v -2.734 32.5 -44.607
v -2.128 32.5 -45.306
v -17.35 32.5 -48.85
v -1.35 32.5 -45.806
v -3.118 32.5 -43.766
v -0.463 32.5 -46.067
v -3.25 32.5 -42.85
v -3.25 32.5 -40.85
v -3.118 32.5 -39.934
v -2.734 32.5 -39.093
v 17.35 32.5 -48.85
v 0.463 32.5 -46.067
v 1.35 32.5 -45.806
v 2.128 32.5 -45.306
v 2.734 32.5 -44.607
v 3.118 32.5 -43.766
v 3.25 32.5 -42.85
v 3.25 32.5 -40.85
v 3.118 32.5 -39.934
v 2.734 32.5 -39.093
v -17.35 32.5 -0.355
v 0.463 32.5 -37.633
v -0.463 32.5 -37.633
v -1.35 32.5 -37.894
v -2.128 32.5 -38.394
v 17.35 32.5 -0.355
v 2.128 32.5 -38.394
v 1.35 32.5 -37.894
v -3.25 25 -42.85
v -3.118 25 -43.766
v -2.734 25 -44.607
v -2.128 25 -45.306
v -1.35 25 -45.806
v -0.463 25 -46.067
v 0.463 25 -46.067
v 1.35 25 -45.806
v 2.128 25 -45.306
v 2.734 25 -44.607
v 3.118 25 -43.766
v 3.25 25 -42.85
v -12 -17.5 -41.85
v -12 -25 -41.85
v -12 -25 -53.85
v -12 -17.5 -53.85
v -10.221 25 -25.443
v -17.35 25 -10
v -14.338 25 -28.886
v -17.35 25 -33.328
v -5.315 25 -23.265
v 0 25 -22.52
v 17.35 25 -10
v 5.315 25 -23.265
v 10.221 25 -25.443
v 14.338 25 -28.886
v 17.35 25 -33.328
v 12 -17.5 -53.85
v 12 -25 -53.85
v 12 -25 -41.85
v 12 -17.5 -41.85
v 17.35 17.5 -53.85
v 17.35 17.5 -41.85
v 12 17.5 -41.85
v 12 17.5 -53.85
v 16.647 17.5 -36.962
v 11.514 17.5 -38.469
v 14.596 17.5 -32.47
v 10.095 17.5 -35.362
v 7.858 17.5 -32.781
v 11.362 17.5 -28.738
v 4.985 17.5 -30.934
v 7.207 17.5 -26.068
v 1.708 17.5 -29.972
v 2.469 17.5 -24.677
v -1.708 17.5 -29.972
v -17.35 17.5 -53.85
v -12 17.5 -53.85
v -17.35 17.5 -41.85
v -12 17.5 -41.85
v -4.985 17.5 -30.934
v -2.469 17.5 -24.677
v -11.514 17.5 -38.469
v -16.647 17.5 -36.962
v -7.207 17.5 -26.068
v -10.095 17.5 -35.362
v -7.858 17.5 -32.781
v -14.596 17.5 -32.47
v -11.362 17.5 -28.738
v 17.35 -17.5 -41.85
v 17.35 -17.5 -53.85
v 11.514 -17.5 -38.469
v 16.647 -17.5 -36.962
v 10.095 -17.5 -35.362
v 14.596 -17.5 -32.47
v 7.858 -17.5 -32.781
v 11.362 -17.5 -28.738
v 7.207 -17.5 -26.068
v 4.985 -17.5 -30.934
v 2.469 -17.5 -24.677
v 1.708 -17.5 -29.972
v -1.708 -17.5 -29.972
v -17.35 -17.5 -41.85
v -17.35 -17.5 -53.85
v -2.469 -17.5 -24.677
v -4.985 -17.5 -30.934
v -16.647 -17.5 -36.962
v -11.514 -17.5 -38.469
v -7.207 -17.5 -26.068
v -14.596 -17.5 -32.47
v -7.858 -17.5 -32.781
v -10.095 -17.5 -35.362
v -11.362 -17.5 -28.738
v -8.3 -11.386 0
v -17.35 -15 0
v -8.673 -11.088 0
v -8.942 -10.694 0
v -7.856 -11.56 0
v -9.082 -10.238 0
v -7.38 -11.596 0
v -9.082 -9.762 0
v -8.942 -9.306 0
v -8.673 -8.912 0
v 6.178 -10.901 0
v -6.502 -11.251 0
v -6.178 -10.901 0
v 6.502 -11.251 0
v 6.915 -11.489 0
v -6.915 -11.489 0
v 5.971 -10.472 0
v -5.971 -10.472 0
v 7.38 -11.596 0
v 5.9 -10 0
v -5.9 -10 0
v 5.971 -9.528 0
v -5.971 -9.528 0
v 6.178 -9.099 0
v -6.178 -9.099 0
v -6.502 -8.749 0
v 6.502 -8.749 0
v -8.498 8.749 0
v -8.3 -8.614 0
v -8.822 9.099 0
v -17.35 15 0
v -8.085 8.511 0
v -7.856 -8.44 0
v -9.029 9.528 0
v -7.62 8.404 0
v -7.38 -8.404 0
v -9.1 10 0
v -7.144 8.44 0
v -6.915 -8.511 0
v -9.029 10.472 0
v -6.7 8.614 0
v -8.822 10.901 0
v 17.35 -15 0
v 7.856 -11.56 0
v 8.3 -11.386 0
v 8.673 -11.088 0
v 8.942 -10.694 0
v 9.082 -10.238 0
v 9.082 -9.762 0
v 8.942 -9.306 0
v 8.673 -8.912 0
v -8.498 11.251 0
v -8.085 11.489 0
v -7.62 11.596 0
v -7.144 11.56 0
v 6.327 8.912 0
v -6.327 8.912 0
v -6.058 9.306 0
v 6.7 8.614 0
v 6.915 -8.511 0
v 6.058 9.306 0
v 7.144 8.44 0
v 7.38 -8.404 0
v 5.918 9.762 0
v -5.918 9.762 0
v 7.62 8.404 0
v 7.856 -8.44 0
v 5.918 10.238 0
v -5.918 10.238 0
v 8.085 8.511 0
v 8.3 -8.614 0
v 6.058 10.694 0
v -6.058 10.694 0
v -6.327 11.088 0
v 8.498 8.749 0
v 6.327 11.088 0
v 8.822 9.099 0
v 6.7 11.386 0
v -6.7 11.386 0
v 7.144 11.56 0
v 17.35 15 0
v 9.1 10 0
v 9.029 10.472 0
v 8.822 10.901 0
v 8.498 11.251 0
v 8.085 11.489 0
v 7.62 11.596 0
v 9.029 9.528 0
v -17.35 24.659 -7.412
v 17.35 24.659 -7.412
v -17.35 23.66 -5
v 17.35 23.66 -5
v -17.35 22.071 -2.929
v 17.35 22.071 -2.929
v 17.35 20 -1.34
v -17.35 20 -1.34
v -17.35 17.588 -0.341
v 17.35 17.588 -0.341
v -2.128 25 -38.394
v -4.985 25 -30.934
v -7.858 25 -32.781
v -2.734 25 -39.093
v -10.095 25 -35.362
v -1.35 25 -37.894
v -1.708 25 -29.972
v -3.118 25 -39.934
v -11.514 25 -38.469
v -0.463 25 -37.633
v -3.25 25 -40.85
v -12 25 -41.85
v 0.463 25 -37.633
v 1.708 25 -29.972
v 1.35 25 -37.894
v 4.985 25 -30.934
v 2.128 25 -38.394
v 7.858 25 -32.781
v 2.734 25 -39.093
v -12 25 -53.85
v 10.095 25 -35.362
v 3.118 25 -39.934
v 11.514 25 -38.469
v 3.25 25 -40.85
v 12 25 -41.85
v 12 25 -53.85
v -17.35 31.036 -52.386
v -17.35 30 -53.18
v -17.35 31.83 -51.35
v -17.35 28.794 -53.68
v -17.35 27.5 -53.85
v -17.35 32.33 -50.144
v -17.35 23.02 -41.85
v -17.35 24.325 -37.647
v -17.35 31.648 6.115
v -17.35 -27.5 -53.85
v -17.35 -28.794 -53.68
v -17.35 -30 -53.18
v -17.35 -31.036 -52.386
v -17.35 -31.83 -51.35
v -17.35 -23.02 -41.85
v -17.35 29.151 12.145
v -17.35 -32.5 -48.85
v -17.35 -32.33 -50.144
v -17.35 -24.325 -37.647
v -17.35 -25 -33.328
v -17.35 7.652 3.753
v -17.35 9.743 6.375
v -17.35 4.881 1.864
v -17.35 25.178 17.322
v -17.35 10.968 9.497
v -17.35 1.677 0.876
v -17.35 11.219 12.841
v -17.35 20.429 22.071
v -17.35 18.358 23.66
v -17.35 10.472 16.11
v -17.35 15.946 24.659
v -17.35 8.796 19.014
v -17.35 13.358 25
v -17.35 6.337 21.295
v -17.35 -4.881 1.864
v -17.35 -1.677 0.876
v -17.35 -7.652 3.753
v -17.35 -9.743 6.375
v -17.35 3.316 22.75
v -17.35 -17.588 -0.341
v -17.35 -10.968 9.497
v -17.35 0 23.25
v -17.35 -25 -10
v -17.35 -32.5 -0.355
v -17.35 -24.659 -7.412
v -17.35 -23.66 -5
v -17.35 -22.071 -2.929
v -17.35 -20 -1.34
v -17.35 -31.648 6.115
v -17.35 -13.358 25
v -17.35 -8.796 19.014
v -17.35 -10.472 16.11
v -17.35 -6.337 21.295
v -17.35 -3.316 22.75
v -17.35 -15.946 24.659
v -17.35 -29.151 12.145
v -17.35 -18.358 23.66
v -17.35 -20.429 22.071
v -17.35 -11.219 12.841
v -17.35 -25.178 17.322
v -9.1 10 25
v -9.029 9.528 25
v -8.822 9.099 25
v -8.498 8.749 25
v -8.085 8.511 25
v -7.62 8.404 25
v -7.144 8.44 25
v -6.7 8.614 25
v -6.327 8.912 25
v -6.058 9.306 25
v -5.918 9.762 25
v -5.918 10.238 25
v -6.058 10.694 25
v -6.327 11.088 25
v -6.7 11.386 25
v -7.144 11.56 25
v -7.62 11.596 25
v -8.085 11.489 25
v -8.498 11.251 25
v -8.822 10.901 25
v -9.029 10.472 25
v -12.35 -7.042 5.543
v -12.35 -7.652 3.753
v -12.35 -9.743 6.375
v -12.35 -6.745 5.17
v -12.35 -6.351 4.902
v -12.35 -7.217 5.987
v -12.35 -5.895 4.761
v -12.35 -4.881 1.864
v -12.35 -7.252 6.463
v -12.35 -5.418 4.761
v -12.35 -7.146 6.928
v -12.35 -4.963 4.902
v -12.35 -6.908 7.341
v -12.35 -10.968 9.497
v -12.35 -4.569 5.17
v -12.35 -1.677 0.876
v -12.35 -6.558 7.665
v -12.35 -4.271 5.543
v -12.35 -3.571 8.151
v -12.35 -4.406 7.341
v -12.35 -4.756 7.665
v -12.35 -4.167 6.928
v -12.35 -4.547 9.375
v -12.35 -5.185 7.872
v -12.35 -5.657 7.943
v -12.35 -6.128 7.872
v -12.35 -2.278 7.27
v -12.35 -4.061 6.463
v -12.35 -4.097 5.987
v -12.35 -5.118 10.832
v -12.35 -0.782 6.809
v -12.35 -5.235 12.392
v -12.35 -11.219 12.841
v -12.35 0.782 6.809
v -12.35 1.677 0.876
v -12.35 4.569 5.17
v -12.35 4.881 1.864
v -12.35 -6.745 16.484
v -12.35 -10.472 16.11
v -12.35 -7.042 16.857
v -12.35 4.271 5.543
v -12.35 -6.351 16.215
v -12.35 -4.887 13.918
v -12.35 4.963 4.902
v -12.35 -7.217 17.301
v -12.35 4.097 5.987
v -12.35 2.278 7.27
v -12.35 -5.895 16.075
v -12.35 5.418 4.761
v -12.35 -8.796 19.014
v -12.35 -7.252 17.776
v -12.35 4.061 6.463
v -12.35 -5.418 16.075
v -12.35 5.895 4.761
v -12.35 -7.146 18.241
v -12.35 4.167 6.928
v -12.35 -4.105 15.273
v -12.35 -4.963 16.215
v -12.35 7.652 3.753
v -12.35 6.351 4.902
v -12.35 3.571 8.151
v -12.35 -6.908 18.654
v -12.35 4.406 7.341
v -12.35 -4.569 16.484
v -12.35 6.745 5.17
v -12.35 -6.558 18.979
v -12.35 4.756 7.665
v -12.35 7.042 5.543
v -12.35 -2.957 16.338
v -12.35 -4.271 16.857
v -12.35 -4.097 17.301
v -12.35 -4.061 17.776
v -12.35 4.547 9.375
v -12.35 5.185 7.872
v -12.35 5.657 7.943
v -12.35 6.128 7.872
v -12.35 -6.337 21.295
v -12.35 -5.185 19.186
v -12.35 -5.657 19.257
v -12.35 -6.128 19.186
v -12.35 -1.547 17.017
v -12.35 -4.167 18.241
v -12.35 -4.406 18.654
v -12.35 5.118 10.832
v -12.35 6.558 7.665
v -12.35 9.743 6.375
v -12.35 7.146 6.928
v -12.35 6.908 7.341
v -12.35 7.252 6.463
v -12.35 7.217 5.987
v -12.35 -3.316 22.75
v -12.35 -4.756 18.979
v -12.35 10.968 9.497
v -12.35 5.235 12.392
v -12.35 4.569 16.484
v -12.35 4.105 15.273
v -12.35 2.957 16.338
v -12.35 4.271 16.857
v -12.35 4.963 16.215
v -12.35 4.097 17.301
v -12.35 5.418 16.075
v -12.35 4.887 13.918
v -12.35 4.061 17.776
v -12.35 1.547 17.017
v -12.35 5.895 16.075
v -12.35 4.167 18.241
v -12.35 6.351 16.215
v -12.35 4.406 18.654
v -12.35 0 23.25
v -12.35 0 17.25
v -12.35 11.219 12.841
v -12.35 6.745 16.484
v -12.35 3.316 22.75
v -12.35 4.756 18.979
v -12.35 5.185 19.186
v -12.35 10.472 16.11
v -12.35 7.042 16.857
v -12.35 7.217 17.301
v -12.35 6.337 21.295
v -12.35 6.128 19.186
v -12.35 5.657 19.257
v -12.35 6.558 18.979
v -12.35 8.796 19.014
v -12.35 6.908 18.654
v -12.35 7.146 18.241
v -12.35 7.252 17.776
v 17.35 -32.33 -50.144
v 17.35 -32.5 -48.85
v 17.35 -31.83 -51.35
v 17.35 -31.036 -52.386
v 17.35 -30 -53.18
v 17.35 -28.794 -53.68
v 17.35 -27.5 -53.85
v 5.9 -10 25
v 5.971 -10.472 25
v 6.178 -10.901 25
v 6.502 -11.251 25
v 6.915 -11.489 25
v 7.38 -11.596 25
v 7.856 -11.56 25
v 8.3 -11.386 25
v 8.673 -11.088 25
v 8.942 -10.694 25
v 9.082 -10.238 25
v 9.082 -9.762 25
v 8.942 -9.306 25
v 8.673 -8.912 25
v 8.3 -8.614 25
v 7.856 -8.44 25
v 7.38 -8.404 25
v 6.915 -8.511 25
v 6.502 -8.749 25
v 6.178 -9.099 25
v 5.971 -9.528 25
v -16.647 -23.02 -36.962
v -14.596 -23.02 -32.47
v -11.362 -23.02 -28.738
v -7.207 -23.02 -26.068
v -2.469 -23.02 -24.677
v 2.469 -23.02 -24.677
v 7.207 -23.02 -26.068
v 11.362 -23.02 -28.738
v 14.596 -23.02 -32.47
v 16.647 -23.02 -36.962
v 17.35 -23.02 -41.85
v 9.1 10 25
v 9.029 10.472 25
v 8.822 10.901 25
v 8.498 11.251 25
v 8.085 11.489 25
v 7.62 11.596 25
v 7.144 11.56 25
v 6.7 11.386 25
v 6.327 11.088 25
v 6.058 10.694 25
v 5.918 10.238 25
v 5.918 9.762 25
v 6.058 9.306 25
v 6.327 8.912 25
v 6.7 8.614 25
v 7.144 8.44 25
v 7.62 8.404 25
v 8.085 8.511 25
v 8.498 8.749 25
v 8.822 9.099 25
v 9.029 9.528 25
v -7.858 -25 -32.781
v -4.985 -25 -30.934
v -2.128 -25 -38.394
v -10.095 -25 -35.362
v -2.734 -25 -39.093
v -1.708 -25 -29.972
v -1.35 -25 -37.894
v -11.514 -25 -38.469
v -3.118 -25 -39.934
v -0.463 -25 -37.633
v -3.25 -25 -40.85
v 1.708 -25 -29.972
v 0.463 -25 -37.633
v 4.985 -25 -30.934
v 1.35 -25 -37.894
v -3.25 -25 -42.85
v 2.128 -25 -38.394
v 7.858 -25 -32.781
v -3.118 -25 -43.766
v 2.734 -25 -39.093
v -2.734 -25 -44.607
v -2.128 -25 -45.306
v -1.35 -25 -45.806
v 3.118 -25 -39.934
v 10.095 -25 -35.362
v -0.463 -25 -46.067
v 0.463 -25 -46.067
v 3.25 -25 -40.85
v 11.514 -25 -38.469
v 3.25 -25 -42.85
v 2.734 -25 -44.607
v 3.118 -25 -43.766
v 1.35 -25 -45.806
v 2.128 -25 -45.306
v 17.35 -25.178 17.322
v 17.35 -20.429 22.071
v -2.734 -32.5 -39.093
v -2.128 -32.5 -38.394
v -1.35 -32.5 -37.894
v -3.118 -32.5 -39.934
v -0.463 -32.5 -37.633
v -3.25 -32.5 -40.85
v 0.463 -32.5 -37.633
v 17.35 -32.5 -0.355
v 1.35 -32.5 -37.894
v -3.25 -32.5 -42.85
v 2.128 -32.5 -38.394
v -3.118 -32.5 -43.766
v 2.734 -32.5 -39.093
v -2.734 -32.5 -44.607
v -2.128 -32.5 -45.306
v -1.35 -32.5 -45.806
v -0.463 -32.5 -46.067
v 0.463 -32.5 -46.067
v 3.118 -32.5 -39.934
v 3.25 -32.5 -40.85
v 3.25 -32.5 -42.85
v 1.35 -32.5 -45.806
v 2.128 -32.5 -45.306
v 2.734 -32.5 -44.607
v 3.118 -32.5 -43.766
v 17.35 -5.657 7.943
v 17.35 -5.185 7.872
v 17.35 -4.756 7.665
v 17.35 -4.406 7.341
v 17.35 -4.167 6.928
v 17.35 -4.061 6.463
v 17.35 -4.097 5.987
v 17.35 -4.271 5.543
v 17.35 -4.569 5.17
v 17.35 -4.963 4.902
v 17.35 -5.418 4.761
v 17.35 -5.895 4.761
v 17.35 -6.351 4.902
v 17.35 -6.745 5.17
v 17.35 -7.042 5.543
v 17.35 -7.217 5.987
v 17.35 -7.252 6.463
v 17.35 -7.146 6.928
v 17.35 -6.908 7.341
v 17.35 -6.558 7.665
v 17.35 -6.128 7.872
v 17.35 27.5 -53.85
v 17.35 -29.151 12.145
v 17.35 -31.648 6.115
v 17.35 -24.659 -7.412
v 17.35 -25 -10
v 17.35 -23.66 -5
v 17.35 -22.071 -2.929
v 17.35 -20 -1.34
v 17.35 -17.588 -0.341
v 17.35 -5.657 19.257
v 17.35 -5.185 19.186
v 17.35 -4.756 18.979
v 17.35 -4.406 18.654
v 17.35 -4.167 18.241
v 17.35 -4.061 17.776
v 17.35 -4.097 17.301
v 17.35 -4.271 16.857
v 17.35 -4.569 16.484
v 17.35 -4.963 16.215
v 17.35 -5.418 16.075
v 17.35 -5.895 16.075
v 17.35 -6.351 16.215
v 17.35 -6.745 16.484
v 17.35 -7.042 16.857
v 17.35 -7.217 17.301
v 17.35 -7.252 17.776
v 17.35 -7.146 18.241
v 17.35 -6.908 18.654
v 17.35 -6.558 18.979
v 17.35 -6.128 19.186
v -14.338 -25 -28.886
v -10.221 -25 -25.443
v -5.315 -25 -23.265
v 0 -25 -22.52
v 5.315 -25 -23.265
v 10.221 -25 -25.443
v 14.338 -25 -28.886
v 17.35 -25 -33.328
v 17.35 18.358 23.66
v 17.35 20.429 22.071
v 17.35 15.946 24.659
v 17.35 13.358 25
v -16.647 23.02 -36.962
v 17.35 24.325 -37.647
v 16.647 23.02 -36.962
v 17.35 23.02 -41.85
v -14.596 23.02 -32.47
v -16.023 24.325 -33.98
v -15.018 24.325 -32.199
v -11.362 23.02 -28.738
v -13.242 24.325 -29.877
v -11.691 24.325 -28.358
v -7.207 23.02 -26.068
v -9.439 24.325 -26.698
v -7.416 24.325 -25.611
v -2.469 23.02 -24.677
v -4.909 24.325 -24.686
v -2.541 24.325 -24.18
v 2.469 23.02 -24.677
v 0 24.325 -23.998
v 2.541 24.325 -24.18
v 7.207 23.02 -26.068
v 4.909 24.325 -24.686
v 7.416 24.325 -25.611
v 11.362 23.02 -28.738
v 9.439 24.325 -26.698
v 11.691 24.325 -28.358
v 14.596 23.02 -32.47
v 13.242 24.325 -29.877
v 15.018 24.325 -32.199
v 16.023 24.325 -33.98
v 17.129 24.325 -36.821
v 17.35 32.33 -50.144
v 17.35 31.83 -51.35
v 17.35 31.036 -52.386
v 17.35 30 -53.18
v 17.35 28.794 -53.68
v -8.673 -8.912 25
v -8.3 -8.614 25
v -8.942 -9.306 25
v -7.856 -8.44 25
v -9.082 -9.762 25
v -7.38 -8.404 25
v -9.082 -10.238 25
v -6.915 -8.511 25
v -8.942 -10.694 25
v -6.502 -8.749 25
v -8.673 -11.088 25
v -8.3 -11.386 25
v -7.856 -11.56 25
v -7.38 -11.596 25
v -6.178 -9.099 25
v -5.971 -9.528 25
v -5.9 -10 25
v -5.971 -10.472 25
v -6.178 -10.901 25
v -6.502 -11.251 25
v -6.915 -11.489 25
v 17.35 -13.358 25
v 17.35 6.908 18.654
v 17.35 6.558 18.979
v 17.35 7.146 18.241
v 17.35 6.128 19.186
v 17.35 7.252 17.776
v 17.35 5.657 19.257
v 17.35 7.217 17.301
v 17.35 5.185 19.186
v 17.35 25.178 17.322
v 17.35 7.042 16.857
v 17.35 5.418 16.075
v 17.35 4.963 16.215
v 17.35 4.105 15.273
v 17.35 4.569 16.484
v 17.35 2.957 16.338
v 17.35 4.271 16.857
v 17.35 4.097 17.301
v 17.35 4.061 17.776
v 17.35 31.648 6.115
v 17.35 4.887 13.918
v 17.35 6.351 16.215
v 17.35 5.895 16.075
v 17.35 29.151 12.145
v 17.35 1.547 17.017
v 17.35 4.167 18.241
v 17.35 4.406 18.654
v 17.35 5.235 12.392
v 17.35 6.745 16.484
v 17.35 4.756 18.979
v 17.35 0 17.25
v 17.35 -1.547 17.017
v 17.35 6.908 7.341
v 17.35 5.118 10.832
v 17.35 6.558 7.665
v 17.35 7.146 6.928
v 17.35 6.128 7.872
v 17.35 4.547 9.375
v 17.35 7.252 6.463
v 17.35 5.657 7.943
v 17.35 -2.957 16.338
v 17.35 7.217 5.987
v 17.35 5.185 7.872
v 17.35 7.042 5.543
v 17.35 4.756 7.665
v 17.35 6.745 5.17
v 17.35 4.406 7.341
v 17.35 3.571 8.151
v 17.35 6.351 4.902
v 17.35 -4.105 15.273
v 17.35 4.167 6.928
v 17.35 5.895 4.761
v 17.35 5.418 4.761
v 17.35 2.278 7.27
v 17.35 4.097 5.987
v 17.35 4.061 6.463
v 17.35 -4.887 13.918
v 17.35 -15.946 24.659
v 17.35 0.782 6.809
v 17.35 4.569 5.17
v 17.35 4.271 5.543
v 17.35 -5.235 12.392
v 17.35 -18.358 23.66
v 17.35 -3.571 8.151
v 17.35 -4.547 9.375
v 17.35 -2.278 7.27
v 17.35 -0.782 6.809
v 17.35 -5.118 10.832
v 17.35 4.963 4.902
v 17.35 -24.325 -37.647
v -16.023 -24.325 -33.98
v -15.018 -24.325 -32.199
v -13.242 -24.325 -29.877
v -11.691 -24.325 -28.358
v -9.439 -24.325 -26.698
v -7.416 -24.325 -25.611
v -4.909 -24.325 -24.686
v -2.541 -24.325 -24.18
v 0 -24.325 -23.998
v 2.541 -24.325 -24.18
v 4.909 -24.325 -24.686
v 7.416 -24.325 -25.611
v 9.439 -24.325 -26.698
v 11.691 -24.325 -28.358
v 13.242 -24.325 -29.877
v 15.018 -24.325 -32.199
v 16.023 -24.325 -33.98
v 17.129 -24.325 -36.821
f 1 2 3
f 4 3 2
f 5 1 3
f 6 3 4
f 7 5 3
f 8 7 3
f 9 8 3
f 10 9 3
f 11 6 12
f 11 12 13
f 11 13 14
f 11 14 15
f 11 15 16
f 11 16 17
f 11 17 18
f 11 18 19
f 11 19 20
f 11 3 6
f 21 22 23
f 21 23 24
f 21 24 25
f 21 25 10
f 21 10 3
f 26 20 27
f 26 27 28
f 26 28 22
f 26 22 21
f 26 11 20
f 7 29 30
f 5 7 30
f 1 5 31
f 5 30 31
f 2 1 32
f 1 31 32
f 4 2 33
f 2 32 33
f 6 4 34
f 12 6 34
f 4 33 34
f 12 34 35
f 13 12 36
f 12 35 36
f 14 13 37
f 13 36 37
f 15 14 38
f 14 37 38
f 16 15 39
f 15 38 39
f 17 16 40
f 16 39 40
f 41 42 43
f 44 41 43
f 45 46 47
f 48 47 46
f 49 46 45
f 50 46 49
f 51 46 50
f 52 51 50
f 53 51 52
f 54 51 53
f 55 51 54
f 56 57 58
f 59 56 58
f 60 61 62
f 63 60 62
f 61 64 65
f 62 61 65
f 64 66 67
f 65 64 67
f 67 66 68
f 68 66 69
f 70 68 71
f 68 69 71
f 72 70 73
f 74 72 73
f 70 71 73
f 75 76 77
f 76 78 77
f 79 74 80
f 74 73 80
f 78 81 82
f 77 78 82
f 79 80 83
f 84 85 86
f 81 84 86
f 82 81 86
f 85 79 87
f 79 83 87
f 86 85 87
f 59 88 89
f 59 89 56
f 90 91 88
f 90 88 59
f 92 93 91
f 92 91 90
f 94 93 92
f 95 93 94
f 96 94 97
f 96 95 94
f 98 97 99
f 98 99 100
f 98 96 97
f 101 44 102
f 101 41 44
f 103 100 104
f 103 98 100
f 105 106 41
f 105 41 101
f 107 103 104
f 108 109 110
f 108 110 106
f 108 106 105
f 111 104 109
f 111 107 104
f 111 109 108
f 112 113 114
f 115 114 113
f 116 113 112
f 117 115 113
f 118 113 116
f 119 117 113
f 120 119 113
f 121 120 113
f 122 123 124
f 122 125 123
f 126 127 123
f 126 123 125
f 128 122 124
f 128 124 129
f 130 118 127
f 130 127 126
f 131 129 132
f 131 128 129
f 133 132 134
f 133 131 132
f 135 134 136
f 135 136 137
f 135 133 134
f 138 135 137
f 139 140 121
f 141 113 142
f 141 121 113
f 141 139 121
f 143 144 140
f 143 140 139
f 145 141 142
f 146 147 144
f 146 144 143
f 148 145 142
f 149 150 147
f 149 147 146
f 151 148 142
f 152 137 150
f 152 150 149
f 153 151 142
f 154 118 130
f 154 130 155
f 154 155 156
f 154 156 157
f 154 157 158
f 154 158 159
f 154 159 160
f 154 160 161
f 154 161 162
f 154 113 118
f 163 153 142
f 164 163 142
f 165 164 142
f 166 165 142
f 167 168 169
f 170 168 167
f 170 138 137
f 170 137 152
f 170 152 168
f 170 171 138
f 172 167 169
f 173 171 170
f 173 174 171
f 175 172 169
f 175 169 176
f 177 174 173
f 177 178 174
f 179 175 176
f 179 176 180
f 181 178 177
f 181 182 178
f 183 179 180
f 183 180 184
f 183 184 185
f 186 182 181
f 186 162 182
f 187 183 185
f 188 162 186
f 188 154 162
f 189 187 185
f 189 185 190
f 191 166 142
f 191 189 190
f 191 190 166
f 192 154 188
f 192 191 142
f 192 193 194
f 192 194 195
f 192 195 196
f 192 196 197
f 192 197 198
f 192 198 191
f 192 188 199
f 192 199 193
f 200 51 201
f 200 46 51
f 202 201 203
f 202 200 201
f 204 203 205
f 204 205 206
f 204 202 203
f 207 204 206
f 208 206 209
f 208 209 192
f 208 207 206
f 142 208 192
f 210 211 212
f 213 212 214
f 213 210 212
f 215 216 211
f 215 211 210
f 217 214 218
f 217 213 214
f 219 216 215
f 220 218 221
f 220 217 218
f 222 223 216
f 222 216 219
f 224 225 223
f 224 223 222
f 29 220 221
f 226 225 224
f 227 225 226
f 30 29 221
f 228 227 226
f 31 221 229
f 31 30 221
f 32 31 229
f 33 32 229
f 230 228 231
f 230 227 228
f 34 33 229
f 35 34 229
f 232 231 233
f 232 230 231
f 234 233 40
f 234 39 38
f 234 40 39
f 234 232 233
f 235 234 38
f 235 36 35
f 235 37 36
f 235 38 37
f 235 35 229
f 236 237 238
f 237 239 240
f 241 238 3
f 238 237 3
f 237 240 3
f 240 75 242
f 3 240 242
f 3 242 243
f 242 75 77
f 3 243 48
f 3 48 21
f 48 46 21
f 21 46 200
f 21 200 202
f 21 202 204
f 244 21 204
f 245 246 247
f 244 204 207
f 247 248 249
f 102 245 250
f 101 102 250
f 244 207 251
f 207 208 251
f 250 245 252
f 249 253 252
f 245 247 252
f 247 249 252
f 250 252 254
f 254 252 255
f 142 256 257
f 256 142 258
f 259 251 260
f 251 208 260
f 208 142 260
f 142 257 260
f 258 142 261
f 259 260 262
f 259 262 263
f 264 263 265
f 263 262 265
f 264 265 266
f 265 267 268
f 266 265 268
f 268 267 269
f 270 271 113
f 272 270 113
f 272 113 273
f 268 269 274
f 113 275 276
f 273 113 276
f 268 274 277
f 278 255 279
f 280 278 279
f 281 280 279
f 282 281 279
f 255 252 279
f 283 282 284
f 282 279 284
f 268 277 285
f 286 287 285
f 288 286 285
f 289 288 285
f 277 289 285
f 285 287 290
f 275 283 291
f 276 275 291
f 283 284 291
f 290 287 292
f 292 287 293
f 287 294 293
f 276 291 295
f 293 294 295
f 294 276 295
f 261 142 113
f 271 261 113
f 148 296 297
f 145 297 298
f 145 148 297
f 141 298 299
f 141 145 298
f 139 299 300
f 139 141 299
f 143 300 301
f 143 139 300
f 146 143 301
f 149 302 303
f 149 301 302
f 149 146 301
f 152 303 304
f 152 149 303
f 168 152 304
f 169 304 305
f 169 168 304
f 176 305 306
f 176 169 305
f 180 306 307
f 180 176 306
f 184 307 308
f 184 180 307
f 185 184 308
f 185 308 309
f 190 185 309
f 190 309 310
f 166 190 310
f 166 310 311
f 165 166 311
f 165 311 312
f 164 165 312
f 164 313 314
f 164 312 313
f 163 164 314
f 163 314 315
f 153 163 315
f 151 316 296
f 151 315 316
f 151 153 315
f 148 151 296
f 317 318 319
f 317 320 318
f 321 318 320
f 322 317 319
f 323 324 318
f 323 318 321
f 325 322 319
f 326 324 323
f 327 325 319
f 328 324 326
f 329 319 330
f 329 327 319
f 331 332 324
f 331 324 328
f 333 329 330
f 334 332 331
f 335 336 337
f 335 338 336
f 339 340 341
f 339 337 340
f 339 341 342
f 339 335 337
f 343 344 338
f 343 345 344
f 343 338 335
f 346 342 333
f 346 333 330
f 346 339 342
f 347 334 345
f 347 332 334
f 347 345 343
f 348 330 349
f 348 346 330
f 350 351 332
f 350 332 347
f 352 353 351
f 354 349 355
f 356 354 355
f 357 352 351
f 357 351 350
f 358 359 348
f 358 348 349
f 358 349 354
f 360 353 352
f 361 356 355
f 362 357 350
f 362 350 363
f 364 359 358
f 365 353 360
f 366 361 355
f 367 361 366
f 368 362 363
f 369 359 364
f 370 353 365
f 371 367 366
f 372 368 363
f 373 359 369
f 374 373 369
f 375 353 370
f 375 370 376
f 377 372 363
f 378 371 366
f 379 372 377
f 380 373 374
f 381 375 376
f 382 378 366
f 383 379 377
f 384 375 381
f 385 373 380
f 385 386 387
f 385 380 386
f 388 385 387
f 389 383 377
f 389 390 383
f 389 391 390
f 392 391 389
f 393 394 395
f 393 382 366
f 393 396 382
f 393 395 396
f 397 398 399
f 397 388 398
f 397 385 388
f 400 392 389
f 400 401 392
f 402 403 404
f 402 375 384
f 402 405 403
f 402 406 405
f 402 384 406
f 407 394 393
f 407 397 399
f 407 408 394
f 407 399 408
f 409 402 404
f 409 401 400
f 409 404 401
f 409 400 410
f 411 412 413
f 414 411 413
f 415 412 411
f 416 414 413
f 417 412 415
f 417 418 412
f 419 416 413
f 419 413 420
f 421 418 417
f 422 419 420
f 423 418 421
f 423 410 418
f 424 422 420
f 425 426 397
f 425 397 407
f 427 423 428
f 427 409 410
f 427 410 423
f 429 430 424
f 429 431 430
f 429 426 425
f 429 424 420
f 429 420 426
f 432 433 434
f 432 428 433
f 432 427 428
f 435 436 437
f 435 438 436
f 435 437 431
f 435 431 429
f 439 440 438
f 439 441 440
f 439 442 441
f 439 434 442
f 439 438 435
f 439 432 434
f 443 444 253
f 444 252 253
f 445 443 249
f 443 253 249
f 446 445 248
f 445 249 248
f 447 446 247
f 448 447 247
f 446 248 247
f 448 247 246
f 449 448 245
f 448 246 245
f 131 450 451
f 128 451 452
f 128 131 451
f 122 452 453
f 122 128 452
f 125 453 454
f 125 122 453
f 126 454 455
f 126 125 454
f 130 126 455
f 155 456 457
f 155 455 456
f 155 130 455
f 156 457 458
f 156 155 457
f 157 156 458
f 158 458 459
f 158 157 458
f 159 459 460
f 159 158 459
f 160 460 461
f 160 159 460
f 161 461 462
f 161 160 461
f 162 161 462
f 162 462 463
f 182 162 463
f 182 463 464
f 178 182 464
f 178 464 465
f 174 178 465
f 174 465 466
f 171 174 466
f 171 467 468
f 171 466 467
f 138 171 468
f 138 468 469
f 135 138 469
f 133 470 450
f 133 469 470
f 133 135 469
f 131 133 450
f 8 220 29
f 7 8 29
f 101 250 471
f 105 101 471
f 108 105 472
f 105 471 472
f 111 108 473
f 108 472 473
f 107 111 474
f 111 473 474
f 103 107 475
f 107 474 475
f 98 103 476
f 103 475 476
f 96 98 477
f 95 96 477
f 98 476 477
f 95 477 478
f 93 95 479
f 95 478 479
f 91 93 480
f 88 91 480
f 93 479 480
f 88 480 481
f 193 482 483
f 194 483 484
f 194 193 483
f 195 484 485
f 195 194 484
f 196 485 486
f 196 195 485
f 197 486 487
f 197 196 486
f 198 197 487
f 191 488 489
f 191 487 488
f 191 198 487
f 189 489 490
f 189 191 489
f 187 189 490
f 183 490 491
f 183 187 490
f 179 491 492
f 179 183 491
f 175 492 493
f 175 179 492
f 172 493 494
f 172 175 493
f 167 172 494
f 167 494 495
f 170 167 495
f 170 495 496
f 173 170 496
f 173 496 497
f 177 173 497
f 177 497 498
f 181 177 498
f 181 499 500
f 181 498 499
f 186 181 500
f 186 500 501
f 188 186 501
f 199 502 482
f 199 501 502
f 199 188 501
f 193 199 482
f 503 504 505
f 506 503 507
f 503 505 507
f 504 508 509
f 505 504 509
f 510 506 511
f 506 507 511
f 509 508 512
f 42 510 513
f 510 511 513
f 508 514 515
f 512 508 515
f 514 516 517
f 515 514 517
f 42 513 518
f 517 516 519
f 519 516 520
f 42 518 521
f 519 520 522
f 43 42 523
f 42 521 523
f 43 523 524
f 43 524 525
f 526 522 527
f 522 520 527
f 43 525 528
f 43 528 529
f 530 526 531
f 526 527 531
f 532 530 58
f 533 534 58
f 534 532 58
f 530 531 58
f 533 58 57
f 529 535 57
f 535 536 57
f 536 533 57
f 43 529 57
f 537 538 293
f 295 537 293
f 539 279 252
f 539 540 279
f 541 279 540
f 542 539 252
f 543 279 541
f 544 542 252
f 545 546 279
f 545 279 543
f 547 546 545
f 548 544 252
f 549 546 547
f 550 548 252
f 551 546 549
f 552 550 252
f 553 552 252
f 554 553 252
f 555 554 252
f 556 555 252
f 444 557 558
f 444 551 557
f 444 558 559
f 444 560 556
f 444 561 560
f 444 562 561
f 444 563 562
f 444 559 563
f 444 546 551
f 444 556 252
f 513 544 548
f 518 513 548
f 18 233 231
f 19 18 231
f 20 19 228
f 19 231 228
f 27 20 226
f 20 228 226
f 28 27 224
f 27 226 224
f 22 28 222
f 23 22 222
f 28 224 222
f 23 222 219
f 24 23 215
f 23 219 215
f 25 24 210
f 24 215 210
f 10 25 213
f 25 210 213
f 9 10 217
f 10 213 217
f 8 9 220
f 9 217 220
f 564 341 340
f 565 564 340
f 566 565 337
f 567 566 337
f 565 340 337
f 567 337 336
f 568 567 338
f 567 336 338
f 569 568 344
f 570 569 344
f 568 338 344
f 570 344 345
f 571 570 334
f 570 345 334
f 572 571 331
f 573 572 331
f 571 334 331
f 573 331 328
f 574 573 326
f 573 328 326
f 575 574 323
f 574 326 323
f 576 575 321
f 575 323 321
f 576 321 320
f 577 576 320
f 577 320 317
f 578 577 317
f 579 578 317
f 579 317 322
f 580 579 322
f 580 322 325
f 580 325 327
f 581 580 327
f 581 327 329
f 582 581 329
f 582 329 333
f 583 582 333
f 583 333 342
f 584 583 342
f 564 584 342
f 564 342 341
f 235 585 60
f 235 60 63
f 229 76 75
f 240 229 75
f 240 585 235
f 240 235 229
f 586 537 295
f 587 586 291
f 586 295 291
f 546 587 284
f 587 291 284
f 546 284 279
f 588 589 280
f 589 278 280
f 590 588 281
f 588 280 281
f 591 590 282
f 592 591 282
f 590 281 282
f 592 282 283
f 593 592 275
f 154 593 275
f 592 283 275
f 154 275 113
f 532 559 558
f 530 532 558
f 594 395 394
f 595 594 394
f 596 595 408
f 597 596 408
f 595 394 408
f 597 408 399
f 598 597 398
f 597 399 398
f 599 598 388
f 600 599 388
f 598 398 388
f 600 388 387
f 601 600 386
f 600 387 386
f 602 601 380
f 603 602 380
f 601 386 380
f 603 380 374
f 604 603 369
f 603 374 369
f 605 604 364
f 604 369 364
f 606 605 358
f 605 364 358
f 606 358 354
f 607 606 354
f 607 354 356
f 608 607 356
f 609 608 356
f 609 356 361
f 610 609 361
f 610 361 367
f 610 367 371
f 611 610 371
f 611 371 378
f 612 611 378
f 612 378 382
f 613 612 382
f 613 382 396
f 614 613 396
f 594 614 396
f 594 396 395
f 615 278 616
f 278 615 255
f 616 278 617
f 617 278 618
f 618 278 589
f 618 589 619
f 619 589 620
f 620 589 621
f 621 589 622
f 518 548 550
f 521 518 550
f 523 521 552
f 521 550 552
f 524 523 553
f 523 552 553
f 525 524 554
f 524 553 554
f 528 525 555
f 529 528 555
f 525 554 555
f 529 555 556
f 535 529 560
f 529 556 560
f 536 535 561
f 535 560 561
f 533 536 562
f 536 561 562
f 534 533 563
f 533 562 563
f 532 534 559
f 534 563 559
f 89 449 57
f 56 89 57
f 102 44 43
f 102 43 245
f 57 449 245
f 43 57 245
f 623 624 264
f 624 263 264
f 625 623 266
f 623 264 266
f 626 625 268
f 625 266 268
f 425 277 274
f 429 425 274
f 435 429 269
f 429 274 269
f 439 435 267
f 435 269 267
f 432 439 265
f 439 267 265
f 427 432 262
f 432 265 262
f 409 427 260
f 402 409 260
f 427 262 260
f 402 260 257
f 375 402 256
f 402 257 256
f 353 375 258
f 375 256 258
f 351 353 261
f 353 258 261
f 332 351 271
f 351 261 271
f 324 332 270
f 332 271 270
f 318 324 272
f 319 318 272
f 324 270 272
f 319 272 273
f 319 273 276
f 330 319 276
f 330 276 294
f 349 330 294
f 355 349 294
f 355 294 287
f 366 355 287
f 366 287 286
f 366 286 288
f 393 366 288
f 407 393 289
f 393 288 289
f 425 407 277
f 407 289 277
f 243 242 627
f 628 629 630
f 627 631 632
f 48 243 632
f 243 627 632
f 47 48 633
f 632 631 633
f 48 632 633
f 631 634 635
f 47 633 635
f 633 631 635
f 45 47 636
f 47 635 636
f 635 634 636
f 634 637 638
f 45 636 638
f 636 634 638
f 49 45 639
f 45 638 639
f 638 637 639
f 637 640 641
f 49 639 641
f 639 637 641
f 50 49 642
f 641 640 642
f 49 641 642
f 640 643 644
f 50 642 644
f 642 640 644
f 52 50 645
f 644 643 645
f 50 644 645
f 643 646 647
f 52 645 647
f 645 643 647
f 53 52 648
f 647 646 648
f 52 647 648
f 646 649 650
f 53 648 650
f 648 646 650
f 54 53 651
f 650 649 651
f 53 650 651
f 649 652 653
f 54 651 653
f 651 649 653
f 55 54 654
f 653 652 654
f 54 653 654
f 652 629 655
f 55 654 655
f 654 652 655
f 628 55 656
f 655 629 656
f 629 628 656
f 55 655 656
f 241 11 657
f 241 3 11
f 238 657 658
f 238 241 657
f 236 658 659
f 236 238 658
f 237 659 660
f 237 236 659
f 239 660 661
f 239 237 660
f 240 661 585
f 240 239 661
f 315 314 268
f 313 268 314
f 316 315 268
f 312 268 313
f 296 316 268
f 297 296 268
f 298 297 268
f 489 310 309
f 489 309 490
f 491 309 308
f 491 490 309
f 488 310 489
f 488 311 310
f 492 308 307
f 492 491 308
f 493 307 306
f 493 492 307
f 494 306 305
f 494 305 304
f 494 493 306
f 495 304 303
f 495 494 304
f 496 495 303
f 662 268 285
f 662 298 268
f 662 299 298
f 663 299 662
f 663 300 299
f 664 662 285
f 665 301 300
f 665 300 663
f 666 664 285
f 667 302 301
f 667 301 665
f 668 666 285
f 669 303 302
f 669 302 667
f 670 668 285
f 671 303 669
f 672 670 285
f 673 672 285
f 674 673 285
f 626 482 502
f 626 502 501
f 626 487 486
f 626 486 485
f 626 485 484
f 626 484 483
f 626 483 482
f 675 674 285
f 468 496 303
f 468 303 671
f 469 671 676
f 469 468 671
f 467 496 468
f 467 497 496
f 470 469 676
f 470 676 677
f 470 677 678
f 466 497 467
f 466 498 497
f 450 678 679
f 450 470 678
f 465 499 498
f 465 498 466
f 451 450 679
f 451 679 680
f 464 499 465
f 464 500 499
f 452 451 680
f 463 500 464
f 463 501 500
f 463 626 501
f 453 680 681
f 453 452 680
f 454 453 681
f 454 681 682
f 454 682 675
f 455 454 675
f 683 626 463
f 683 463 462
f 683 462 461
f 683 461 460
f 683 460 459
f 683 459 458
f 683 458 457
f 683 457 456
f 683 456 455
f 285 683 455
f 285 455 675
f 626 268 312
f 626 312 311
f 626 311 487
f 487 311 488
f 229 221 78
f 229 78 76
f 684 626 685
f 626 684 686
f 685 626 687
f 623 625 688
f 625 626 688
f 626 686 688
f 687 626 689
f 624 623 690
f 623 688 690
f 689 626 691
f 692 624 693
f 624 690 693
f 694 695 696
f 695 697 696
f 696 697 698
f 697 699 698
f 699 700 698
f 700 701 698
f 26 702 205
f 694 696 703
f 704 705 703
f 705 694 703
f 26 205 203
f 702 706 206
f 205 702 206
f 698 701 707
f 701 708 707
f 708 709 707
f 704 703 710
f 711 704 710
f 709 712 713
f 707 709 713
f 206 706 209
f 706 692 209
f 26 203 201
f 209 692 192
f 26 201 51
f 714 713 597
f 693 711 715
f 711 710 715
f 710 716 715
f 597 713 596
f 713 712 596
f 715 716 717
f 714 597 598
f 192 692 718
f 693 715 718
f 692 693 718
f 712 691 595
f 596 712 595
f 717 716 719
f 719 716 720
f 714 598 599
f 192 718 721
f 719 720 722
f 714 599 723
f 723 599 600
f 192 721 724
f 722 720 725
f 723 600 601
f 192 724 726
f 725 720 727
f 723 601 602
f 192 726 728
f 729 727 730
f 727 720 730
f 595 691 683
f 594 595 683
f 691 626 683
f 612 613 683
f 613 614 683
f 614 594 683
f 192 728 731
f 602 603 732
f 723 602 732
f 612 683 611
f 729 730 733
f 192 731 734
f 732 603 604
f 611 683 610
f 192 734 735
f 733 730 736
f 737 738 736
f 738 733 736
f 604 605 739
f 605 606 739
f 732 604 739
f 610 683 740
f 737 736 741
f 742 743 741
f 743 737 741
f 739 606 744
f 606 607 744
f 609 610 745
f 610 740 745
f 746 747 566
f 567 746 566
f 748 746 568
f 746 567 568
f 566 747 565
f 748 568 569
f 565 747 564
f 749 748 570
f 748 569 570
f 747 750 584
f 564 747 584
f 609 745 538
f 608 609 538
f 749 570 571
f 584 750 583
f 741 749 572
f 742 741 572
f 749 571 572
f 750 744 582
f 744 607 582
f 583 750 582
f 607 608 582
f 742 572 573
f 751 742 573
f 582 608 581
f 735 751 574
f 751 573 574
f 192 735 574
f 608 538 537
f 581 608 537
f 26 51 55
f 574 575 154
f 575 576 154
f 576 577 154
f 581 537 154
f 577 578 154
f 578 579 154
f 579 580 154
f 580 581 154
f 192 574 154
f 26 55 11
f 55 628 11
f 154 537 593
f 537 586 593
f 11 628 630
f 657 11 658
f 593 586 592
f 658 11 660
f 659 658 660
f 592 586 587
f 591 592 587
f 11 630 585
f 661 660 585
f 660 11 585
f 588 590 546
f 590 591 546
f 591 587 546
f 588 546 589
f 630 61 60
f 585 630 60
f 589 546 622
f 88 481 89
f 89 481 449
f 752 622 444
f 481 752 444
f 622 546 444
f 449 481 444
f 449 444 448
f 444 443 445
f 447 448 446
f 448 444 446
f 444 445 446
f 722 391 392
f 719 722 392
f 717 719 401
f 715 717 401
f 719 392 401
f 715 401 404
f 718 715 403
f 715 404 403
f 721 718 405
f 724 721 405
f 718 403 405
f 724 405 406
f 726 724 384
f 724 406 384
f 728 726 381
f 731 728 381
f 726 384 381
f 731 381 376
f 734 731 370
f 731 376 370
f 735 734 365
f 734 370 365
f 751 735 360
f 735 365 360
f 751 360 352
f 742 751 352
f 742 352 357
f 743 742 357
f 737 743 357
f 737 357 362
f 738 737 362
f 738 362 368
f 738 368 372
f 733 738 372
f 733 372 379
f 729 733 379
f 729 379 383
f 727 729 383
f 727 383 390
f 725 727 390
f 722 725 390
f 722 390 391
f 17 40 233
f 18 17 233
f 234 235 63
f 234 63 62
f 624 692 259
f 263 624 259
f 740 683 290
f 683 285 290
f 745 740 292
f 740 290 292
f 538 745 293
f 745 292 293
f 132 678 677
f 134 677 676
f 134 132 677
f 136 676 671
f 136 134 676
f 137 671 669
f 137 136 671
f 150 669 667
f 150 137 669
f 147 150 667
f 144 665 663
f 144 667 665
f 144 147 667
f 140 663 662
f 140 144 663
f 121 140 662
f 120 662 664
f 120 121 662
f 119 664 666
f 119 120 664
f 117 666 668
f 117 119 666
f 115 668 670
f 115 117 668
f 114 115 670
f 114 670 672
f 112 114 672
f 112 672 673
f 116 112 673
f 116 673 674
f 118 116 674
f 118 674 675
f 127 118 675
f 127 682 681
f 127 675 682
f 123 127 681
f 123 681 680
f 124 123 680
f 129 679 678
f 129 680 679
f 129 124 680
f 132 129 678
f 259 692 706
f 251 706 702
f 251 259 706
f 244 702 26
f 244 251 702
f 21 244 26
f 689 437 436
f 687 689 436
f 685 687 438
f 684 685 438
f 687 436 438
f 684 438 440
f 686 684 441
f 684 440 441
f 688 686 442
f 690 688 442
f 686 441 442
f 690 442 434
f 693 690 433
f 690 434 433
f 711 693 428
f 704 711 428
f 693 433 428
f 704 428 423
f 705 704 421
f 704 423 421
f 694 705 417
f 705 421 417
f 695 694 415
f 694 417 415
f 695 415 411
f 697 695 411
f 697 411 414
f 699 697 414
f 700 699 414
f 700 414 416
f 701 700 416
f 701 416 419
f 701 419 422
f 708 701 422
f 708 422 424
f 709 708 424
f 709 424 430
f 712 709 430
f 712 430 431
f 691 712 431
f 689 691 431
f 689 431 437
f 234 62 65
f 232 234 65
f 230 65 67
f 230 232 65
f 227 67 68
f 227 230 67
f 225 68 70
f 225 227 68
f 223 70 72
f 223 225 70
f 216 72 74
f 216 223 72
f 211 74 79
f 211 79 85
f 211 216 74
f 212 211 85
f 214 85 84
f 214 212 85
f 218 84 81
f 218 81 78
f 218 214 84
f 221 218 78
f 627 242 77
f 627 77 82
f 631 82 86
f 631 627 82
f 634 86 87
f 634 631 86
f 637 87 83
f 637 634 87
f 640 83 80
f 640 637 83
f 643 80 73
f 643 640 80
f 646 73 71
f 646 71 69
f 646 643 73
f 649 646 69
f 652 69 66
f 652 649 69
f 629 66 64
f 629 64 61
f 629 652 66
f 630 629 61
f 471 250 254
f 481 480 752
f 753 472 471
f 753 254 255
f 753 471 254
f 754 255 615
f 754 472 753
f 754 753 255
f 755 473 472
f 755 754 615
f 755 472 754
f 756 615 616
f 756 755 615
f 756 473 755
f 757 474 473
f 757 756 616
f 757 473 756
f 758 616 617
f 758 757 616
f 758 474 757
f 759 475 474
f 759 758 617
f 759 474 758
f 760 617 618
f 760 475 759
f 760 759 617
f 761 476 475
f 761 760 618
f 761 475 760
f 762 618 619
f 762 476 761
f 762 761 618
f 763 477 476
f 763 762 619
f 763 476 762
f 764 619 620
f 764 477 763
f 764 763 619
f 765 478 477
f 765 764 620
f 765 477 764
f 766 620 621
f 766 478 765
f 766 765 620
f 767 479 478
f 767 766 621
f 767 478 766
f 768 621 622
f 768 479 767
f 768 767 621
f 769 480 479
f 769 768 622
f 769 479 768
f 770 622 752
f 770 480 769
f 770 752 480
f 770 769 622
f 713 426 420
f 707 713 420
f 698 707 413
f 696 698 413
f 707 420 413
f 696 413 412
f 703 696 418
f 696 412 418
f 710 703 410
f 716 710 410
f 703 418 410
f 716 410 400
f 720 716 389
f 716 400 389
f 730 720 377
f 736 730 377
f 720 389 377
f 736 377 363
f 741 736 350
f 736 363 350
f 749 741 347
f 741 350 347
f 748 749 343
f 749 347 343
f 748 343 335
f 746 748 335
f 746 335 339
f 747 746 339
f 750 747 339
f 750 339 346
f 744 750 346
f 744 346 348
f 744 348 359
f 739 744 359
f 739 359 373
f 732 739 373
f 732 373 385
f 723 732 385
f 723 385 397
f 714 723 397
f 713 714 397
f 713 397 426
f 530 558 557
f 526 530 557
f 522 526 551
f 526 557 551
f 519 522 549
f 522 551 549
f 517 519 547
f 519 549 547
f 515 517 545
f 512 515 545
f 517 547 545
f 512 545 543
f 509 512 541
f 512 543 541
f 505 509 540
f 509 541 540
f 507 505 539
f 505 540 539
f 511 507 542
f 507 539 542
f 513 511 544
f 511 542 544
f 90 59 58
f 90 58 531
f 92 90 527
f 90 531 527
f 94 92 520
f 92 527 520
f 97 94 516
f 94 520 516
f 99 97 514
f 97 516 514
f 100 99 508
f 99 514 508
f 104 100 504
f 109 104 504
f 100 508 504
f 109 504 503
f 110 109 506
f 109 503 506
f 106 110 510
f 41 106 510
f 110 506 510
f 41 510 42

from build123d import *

# Parameters (mm, degrees)
SKETCH1_W               = 34.7
SKETCH1_H               = 27
SKETCH1_R               = 1.6
BOSS_EXTRUDE1_DEPTH     = 25
SKETCH4_R               = 1.6
SKETCH4_R_2             = 5.25
BASE_EXTRUDE_DEPTH      = 45.847965394
SKETCH4_3_R             = 11.25
SKETCH4_3_R_2           = 5.25
SKETCH4_3_R_3           = 1.6
CUT_EXTRUDE3_DEPTH      = 5
BOSS_EXTRUDE5_DEPTH     = 34.7
CHAMFER3_SIZE           = 12.5
CHAMFER3_SIZE2          = 15
FILLET1_R               = 10
FILLET3_R               = 20
FILLET4_R               = 7.5
BOSS_EXTRUDE6_DEPTH     = 7.5
FILLET5_R               = 2
SKETCH13_R              = 3.25
CUT_EXTRUDE5_DEPTH      = 18.5
CHAMFER4_SIZE           = 15
FILLET11_R              = 10
FILLET12_R              = 25
FILLET13_R              = 5
CUT_EXTRUDE6_DEPTH      = 66.246417783
CUT_EXTRUDE6_DEPTH_BACK = 66.246417783


with BuildPart() as part:
    # Sketch1 → Boss-Extrude1 (new body)
    with BuildSketch(Plane.XY):
        Rectangle(SKETCH1_W, SKETCH1_H)
        with Locations((-7.5, -10)):
            Circle(SKETCH1_R, mode=Mode.SUBTRACT)
        with Locations(Location((7.5, -10, 0), (0, 0, 180))):
            Circle(SKETCH1_R, mode=Mode.SUBTRACT)
        with Locations((7.5, 10)):
            Circle(SKETCH1_R, mode=Mode.SUBTRACT)
        with Locations(Location((-7.5, 10, 0), (0, 0, 180))):
            Circle(SKETCH1_R, mode=Mode.SUBTRACT)
    extrude(amount=BOSS_EXTRUDE1_DEPTH)

    # Sketch4 → Base Extrude (cut, through all)
    with BuildSketch(Plane.ZY.offset(17.35)):
        with Locations((6.343145751, 5.656854249)):
            Circle(SKETCH4_R)
        with Locations((17.656854249, 5.656854249)):
            Circle(SKETCH4_R)
        with Locations((17.656854249, -5.656854249)):
            Circle(SKETCH4_R)
        with Locations((6.343145751, -5.656854249)):
            Circle(SKETCH4_R)
        with Locations((12, 0)):
            Circle(SKETCH4_R_2)
    extrude(amount=-BASE_EXTRUDE_DEPTH, mode=Mode.SUBTRACT)

    # Sketch4<3> → Cut-Extrude3 (cut)
    with BuildSketch(Plane.ZY.offset(17.35)):
        with Locations((12, 0)):
            Circle(SKETCH4_3_R)
        with Locations((12, 0)):
            Circle(SKETCH4_3_R_2, mode=Mode.SUBTRACT)
        with Locations((6.343145751, 5.656854249)):
            Circle(SKETCH4_3_R_3, mode=Mode.SUBTRACT)
        with Locations((17.656854249, 5.656854249)):
            Circle(SKETCH4_3_R_3, mode=Mode.SUBTRACT)
        with Locations((17.656854249, -5.656854249)):
            Circle(SKETCH4_3_R_3, mode=Mode.SUBTRACT)
        with Locations((6.343145751, -5.656854249)):
            Circle(SKETCH4_3_R_3, mode=Mode.SUBTRACT)
    extrude(amount=-CUT_EXTRUDE3_DEPTH, mode=Mode.SUBTRACT)

    # Sketch10 → Boss-Extrude5 (add)
    with BuildSketch(Plane(origin=(17.35, 0, 0), x_dir=(0, 0, -1), z_dir=(1, 0, 0))):
        Polygon((0, 13.5), (0, 25), (53.849999999, 25), (53.849999999, 32.5), (-25, 32.5), (-25, 13.5), align=None)
        Polygon((-25, -13.5), (-25, -32.5), (53.849999999, -32.5), (53.849999999, -25), (0, -25), (0, -13.5), align=None)
    extrude(amount=-BOSS_EXTRUDE5_DEPTH)

    # Chamfer3
    chamfer3_edges = [part.edges().sort_by_distance(p)[0] for p in [
        (0, 32.5, 25),
    ]]
    chamfer3_side = [part.faces().sort_by_distance(p)[0] for p in [
        (0, 0, 25),
    ]]
    chamfer(chamfer3_edges, length=CHAMFER3_SIZE, length2=CHAMFER3_SIZE2, reference=chamfer3_side[0])

    # Fillet1
    fillet1_edges = [part.edges().sort_by_distance(p)[0] for p in [
        (0, 25, 0),
    ]]
    fillet(fillet1_edges, radius=FILLET1_R)

    # Fillet3
    fillet3_edges = [part.edges().sort_by_distance(p)[0] for p in [
        (0, 32.5, 10),
    ]]
    fillet(fillet3_edges, radius=FILLET3_R)

    # Fillet4
    fillet4_edges = [part.edges().sort_by_distance(p)[0] for p in [
        (0, 20, 25),
    ]]
    fillet(fillet4_edges, radius=FILLET4_R)

    # Sketch11 → Boss-Extrude6 (add)
    with BuildSketch(Plane.XZ.offset(-25)):
        with BuildLine():
            Line((-12, -53.849999999), (-17.35, -53.849999999))
            Line((-17.35, -53.849999999), (-17.35, -41.849999999))
            ThreePointArc((-17.35, -41.849999999), (0, -24.499999999), (17.35, -41.849999999))
            Line((17.35, -41.849999999), (17.35, -53.849999999))
            Line((17.35, -53.849999999), (12, -53.849999999))
            Line((12, -53.849999999), (12, -41.849999999))
            ThreePointArc((12, -41.849999999), (0, -29.849999999), (-12, -41.849999999))
            Line((-12, -41.849999999), (-12, -53.849999999))
        make_face()
    extrude(amount=BOSS_EXTRUDE6_DEPTH)

    # Fillet5
    # the kernel refuses this fillet: 2 mm, written as the material it adds along each edge
    with BuildSketch(Plane(origin=(0, 25, -41.849999999), x_dir=(-0.9586337455117862, 0, -0.28464248095820854), z_dir=(0.28464248095820854, 0, -0.9586337455117862))) as fillet5_piece_1_section:
        with BuildLine():
            CenterArc((19.3499, -1.9999), FILLET5_R, 90, 90)
            Line((17.3499, -1.9999), (17.3099, -1.9999))
            ThreePointArc((17.3099, -1.9999), (17.31, -0.99995), (17.31, 0))
            Line((17.31, 0), (17.35, 0.04))
            ThreePointArc((17.35, 0.04), (18.34995, 0.04), (19.3499, 0.0401))
            Line((19.3499, 0.0401), (19.3499, 0.0001))
        make_face()
    fillet5_piece_1 = revolve(axis=Axis((0, 25, -41.849999999), (0, 1, 0)), revolution_arc=213.074958292, mode=Mode.PRIVATE)
    fillet5_piece_1 = split(fillet5_piece_1, bisect_by=Plane(origin=(17.35, 24.441377489, -23.941377488), z_dir=(-1, 0, 0)), keep=Keep.TOP, mode=Mode.PRIVATE)
    fillet5_piece_1 = split(fillet5_piece_1, bisect_by=Plane(origin=(-17.35, 24.441377489, -23.941377488), z_dir=(1, 0, 0)), keep=Keep.TOP, mode=Mode.PRIVATE)
    add(fillet5_piece_1)

    # Sketch13 → Cut-Extrude5 (cut)
    with BuildSketch(Plane.XZ.offset(-25)):
        with Locations(Location((0, -41.849999999, 0), (0, 0, 270))):
            Circle(SKETCH13_R)
    extrude(amount=-CUT_EXTRUDE5_DEPTH, mode=Mode.SUBTRACT)

    # Mirror12: part across plane


with BuildPart() as part_1:
    add(part.part)
    add(part.part.mirror(Plane.ZX))

    # Chamfer4
    chamfer4_edges = [part_1.edges().sort_by_distance(p)[0] for p in [
        (0, 32.5, 25),
        (0, -32.5, 25),
    ]]
    chamfer(chamfer4_edges, length=CHAMFER4_SIZE)

    # Fillet11
    fillet11_edges = [part_1.edges().sort_by_distance(p)[0] for p in [
        (0, 17.5, 25),
        (0, -17.5, 25),
    ]]
    fillet(fillet11_edges, radius=FILLET11_R)

    # Fillet12
    fillet12_edges = [part_1.edges().sort_by_distance(p)[0] for p in [
        (0, -32.5, 10),
        (0, 32.5, 10),
    ]]
    fillet(fillet12_edges, radius=FILLET12_R)

    # Fillet13
    fillet13_edges = [part_1.edges().sort_by_distance(p)[0] for p in [
        (0, 32.5, -53.849999999),
        (0, -32.5, -53.849999999),
    ]]
    fillet(fillet13_edges, radius=FILLET13_R)

    # Sketch14 → Cut-Extrude6 (cut, two sides: drawn at the far end of the back side and taken through both)
    with BuildSketch(Plane(origin=(0, 0, 0), x_dir=(1, 0, 0), z_dir=(0, 1, 0)).offset(-CUT_EXTRUDE6_DEPTH_BACK)):
        with BuildLine():
            Line((-3.25, 40.849999999), (-3.25, 42.849999999))
            ThreePointArc((-3.25, 42.849999999), (0, 46.099999999), (3.25, 42.849999999))
            Line((3.25, 42.849999999), (3.25, 40.849999999))
            ThreePointArc((3.25, 40.849999999), (0, 37.599999999), (-3.25, 40.849999999))
        make_face()
    extrude(amount=CUT_EXTRUDE6_DEPTH + CUT_EXTRUDE6_DEPTH_BACK, mode=Mode.SUBTRACT)


solid = part_1.part
